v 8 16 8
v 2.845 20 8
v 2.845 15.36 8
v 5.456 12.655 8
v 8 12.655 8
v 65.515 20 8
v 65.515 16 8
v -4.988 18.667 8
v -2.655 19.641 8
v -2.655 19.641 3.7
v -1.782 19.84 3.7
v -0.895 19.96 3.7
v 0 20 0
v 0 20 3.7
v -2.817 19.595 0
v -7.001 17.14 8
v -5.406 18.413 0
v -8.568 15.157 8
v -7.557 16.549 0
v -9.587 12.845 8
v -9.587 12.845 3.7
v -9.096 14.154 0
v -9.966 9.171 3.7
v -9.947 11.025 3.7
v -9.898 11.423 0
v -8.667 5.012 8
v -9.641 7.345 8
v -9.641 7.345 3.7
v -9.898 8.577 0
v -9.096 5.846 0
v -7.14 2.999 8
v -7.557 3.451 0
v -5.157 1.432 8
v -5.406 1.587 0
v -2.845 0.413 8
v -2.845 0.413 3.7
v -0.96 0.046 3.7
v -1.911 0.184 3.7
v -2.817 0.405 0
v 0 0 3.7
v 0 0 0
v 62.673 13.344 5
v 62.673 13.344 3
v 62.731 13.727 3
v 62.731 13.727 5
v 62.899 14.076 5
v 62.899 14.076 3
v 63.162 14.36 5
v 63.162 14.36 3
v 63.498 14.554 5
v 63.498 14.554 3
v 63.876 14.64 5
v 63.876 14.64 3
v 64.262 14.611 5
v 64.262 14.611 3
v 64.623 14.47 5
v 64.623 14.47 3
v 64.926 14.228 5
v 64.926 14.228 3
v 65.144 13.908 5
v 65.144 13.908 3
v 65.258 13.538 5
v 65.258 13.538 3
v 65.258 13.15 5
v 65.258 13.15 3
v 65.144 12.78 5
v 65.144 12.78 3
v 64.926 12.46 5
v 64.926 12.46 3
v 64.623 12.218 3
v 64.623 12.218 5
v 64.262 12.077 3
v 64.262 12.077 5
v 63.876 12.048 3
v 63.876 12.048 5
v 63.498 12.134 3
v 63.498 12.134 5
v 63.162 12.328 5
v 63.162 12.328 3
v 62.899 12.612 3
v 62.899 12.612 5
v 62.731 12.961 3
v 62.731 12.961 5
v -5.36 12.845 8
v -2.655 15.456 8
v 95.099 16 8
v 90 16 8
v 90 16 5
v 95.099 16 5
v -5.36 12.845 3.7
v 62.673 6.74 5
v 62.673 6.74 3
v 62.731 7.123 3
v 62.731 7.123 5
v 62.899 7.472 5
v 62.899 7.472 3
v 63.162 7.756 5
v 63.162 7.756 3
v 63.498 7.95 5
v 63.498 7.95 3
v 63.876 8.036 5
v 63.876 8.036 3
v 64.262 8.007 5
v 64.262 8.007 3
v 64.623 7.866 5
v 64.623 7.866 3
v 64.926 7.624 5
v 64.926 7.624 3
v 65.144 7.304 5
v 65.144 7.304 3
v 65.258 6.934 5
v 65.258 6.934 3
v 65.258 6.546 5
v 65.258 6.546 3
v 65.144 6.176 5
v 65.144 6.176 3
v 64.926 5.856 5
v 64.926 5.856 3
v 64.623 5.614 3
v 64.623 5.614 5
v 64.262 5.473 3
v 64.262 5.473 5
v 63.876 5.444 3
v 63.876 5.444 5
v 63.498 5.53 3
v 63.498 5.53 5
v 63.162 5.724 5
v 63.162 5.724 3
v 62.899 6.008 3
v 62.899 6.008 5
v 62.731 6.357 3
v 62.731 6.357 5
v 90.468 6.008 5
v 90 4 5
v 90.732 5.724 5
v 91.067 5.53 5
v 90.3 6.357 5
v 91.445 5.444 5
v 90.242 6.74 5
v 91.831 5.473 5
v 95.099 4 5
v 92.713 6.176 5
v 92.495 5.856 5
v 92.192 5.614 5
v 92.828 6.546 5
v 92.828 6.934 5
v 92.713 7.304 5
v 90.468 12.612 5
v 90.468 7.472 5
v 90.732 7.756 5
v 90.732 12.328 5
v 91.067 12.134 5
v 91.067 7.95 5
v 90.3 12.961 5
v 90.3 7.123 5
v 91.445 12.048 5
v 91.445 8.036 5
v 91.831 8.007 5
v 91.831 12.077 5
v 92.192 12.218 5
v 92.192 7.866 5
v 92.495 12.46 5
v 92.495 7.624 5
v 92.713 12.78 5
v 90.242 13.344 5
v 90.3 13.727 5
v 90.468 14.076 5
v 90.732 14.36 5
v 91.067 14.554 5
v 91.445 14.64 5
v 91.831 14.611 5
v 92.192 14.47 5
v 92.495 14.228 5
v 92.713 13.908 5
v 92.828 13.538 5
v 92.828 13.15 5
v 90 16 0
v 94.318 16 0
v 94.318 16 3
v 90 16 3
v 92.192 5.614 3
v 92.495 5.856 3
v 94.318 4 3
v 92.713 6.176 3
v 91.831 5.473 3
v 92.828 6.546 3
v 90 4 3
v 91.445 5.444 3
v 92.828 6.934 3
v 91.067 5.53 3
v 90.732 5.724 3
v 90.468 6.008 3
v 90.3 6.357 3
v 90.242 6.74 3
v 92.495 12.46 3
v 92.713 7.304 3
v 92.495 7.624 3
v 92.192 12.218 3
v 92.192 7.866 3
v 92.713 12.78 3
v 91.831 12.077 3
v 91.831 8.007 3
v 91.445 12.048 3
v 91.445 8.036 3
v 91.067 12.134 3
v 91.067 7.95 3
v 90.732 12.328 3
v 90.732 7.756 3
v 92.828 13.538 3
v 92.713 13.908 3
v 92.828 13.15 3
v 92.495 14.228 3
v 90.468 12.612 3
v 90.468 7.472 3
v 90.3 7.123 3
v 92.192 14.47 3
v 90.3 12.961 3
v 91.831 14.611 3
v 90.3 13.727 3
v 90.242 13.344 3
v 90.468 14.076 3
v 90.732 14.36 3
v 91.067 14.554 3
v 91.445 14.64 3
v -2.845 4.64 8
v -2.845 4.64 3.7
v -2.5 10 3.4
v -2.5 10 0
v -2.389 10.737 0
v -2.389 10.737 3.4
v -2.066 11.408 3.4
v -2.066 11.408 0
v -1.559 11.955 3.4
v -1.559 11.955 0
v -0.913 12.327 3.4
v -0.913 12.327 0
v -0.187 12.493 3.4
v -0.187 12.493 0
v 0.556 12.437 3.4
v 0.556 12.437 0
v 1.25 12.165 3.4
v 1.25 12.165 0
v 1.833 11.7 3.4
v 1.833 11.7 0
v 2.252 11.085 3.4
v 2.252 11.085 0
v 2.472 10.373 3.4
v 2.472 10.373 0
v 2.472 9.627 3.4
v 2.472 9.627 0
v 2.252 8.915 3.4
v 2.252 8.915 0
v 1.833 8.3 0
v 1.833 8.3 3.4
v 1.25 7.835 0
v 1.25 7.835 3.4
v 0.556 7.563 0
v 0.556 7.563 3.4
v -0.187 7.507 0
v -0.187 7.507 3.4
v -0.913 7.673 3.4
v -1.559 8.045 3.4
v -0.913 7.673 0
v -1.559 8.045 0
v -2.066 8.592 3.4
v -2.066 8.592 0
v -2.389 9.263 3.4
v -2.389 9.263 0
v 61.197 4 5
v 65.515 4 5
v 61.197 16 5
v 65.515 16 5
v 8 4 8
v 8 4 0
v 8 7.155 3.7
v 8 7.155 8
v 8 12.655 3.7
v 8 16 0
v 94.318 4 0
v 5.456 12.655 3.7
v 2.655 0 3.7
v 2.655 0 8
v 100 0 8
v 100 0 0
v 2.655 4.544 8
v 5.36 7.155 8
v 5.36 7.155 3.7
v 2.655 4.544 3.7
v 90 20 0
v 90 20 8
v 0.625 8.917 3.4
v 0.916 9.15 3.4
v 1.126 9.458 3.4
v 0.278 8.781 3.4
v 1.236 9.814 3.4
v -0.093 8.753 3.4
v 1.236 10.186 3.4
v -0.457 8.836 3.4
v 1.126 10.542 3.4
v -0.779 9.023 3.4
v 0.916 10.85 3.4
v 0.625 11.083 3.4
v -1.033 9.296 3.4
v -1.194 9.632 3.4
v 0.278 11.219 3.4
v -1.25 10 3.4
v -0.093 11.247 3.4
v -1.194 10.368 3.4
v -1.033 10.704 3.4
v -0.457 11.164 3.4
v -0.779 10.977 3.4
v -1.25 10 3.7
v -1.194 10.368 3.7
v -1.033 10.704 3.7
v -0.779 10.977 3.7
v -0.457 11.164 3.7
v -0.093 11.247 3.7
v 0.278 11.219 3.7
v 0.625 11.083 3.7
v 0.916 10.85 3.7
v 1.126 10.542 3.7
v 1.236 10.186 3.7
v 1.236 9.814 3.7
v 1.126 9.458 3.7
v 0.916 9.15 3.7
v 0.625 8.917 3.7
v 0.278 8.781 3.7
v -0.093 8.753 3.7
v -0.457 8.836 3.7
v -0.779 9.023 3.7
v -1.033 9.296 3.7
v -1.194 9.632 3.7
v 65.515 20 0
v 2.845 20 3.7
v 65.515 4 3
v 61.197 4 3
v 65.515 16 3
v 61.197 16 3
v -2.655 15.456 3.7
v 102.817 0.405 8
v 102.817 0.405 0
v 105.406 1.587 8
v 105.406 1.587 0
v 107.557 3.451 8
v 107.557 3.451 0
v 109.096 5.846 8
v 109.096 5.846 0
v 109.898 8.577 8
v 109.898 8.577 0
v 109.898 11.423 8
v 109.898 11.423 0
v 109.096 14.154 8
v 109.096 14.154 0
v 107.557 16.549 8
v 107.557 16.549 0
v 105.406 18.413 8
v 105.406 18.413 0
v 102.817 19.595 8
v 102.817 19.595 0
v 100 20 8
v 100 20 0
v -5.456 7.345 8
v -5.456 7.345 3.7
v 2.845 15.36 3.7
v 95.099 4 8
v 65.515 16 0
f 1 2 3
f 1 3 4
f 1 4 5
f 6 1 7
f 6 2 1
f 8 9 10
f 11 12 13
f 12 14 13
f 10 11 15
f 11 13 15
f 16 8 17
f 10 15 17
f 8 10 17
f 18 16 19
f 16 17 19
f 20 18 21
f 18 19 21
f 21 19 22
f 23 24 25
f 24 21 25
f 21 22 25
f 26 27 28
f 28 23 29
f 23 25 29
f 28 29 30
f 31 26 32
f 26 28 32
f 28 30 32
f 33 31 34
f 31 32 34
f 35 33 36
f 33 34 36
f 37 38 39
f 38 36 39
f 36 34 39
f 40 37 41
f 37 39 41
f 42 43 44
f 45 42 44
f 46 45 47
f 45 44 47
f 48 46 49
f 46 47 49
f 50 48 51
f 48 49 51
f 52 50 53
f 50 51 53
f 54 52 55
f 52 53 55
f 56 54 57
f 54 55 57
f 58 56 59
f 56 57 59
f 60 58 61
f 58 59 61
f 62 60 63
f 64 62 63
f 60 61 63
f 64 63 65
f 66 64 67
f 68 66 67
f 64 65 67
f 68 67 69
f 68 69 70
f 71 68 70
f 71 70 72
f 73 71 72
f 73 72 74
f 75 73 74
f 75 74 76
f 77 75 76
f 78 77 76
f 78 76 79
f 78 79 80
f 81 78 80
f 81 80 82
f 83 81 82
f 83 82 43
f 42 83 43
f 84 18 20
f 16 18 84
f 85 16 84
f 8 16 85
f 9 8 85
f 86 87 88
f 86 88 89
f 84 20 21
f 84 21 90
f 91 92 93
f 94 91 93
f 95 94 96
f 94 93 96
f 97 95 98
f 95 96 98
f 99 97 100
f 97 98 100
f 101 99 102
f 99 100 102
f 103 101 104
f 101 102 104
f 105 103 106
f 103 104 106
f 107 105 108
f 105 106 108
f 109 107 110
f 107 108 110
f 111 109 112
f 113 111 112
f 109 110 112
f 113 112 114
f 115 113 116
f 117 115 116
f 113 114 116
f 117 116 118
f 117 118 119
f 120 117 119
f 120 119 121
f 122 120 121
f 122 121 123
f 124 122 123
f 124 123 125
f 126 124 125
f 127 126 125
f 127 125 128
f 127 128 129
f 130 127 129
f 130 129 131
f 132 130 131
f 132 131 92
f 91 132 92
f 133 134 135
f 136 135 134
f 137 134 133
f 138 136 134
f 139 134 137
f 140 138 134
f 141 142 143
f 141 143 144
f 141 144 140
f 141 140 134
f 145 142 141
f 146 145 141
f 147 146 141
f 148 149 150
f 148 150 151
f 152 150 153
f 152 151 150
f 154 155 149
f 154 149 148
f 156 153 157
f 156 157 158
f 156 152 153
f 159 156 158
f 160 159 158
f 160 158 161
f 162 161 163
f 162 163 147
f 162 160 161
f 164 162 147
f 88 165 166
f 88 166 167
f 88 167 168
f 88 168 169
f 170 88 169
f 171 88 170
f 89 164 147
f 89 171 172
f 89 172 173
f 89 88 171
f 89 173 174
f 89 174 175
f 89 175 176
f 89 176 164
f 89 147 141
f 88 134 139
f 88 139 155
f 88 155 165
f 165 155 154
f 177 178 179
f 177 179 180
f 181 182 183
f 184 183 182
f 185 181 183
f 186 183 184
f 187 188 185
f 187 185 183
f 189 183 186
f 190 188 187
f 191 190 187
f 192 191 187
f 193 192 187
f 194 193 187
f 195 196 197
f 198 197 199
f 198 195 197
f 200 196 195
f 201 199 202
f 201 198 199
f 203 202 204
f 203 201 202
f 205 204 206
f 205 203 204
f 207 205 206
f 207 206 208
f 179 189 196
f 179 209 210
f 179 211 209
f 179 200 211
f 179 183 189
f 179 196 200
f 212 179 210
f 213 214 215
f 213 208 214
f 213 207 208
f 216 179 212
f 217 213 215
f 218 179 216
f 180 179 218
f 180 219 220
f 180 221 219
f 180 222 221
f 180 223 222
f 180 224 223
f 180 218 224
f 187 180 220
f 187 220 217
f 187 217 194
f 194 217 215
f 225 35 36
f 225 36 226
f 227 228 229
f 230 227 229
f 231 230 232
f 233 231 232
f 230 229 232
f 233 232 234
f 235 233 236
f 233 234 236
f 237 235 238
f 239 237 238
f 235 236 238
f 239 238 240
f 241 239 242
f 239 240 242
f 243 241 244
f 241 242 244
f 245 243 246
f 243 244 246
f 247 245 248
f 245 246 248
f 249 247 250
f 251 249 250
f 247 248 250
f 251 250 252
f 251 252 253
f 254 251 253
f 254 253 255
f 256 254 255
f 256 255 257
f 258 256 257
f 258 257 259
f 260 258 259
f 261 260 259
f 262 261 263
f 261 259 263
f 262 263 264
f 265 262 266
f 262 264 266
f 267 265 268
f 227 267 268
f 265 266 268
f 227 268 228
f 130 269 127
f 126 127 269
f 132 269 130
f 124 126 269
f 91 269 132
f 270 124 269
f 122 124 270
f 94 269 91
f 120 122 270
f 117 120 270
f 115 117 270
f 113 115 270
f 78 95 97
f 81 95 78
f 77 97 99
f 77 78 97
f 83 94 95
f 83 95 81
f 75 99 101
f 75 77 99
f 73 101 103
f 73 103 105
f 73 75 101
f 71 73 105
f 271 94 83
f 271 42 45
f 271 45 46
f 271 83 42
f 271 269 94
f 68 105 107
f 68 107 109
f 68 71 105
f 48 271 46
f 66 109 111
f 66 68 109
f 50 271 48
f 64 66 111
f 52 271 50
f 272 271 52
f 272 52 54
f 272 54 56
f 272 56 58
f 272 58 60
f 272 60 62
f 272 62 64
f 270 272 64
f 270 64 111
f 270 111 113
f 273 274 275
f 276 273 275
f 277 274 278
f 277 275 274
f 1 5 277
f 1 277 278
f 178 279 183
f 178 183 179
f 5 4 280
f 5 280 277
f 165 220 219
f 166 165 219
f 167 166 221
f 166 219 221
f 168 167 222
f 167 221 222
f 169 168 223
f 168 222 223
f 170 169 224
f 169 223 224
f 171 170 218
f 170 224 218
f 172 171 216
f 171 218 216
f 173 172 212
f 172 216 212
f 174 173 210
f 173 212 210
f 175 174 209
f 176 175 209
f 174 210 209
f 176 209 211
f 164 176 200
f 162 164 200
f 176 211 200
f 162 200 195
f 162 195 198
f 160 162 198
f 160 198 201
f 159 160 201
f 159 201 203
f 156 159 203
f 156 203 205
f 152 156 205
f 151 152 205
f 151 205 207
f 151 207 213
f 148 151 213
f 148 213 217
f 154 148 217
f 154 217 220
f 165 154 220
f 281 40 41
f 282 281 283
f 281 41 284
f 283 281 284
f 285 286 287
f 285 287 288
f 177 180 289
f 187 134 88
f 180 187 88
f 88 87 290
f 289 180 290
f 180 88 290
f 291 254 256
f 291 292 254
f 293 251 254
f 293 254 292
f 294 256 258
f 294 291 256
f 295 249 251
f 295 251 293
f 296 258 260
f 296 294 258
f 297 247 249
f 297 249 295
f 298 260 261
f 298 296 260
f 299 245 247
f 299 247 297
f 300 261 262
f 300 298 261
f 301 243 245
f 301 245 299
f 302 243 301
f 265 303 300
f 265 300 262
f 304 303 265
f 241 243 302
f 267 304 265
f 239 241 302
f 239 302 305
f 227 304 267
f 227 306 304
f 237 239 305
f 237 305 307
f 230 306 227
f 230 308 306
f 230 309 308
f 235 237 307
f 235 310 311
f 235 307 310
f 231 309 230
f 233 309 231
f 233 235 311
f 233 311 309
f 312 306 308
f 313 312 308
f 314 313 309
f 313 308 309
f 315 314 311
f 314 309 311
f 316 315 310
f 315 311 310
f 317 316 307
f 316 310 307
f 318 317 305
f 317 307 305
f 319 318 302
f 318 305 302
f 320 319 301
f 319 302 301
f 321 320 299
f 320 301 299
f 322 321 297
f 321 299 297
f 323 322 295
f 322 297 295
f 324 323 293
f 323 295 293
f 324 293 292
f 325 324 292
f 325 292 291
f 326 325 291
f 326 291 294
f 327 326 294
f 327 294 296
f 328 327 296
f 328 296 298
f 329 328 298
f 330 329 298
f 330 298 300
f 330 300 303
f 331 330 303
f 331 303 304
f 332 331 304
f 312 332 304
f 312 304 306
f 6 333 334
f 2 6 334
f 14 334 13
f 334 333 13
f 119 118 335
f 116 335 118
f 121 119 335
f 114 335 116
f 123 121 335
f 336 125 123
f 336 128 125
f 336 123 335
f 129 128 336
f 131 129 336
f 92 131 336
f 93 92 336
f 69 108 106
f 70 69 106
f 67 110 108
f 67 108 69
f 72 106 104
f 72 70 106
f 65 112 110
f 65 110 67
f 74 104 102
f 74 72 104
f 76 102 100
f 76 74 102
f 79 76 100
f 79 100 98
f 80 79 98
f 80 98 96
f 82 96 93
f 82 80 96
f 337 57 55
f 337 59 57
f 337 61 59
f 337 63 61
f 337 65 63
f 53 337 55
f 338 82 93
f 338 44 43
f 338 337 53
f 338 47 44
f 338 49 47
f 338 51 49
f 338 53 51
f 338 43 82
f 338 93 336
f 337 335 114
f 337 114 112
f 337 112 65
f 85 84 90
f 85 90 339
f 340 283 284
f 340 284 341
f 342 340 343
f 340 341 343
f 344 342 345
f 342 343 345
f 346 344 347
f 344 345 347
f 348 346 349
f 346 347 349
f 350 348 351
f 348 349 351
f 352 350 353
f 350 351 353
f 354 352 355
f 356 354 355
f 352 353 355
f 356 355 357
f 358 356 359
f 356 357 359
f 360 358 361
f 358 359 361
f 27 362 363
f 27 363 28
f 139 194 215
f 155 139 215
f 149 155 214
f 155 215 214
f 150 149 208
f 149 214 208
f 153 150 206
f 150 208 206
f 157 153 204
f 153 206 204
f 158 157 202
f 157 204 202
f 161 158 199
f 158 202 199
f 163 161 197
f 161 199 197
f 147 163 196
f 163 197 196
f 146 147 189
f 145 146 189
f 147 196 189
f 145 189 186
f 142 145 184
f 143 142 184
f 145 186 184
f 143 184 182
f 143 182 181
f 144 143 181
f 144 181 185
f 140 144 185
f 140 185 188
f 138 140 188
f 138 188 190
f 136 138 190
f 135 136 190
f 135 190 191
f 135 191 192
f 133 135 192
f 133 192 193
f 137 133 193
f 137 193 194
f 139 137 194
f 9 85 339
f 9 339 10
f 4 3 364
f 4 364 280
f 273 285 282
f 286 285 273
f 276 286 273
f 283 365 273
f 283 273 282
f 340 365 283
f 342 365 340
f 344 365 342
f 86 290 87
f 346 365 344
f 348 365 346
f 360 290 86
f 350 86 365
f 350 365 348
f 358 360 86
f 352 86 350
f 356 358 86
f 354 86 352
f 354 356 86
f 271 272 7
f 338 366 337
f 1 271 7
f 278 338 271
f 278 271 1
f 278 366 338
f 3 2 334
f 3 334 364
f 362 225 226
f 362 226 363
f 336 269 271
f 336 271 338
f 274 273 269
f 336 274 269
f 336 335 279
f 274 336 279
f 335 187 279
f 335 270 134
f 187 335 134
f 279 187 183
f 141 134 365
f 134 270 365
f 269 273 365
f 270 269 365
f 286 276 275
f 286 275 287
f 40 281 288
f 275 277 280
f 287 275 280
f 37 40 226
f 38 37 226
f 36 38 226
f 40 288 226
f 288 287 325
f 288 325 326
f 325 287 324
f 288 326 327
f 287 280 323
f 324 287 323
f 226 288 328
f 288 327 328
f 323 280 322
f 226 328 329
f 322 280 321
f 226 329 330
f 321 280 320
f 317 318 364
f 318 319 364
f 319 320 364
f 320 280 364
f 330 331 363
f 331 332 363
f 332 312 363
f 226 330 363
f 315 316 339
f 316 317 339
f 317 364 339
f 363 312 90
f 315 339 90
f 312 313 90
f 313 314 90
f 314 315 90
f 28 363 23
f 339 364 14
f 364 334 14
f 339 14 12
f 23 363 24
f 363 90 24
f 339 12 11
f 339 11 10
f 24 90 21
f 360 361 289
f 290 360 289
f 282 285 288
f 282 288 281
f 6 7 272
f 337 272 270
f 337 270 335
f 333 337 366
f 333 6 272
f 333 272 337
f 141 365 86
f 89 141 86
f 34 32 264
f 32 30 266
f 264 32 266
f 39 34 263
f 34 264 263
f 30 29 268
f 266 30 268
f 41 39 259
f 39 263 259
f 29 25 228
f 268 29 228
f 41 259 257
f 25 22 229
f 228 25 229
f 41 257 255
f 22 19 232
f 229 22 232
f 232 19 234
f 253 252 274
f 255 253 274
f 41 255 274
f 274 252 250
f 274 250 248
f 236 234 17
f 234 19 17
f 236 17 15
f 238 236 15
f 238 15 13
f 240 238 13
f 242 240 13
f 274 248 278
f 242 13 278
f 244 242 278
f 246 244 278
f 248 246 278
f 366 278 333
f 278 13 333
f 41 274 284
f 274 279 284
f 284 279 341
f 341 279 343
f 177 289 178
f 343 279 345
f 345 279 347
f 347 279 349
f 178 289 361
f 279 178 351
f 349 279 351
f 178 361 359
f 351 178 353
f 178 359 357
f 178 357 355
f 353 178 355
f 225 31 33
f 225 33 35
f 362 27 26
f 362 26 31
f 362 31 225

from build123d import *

# Parameters (mm, degrees)
BOSS_EXTRU_1_DEPTH       = 8
ESQUISSE4_W              = 82
ESQUISSE4_H              = 12
ENL_V_MAT_EXTRU_3_DEPTH  = 9
BOSS_EXTRU_2_REACH       = 18
ESQUISSE6_W              = 4.318
ESQUISSE6_H              = 8
ESQUISSE7_R              = 1.3
ENL_V_MAT_EXTRU_5_DEPTH  = 10
ESQUISSE8_W              = 5.09860661
ESQUISSE8_H              = 12
ESQUISSE8_W_2            = 4.318
ENL_V_MAT_EXTRU_6_DEPTH  = 3
ESQUISSE13_R             = 4
ENL_V_MAT_EXTRU_9_DEPTH  = 4.3
ENL_V_MAT_EXTRU_10_DEPTH = 4.3
ESQUISSE15_R             = 2.5
ENL_V_MAT_EXTRU_11_DEPTH = 3.4
ENL_V_MAT_EXTRU_12_REACH = 6.6
ESQUISSE16_R             = 1.25
ESQUISSE17_W             = 24.484825334
ESQUISSE17_H             = 8
ENL_V_MAT_EXTRU_13_DEPTH = 4.3
ESQUISSE18_W             = 4.318
ESQUISSE18_H             = 12
ENL_V_MAT_EXTRU_14_DEPTH = 3


with BuildPart() as part:
    # Esquisse1 → Boss.-Extru.1 (new body)
    with BuildSketch(Plane.XY):
        with BuildLine():
            Line((0, 0), (100, 0))
            ThreePointArc((100, 0), (110, 10), (100, 20))
            Line((100, 20), (0, 20))
            ThreePointArc((0, 20), (-10, 10), (0, 0))
        make_face()
    extrude(amount=BOSS_EXTRU_1_DEPTH)

    # Esquisse4 → Enlèv. mat.-Extru.3 (cut, through all)
    with BuildSketch(Plane.XY.offset(8)):
        with Locations((49, 10)):
            Rectangle(ESQUISSE4_W, ESQUISSE4_H)
    extrude(amount=-ENL_V_MAT_EXTRU_3_DEPTH, mode=Mode.SUBTRACT)

    # Esquisse6 → Boss.-Extru.2 (add, up to next)
    with BuildSketch(Plane(origin=(0, 4, 0), x_dir=(1, 0, 0), z_dir=(0, 1, 0)), mode=Mode.PRIVATE) as boss_extru_2_sk1:
        with Locations((63.356174666, -4)):
            Rectangle(ESQUISSE6_W, ESQUISSE6_H)
    boss_extru_2_tool1 = extrude(boss_extru_2_sk1.sketch, amount=BOSS_EXTRU_2_REACH, mode=Mode.PRIVATE) - part.part
    add(boss_extru_2_tool1.solids().sort_by_distance((63.356175, 4, 4))[0])

    # Esquisse7 → Enlèv. mat.-Extru.5 (cut)
    with BuildSketch(Plane(origin=(0, 0, 0), x_dir=(-1, 0, 0), z_dir=(0, 0, -1))):
        with Locations((-91.542174666, 13.344)):
            Circle(ESQUISSE7_R)
        with Locations((-91.542174666, 6.74)):
            Circle(ESQUISSE7_R)
        with Locations((-63.973, 6.74)):
            Circle(ESQUISSE7_R)
        with Locations((-63.973, 13.344)):
            Circle(ESQUISSE7_R)
    extrude(amount=-ENL_V_MAT_EXTRU_5_DEPTH, mode=Mode.SUBTRACT)

    # Esquisse8 → Enlèv. mat.-Extru.6 (cut)
    with BuildSketch(Plane.XY.offset(8)):
        with Locations((92.549303305, 10)):
            Rectangle(ESQUISSE8_W, ESQUISSE8_H)
        with Locations((63.356174666, 10)):
            Rectangle(ESQUISSE8_W_2, ESQUISSE8_H)
    extrude(amount=-ENL_V_MAT_EXTRU_6_DEPTH, mode=Mode.SUBTRACT)

    # Esquisse13 → Enlèv. mat.-Extru.9 (cut)
    with BuildSketch(Plane.XY.offset(8)):
        with Locations((0, 10)):
            Circle(ESQUISSE13_R)
    extrude(amount=-ENL_V_MAT_EXTRU_9_DEPTH, mode=Mode.SUBTRACT)

    # Esquisse14 → Enlèv. mat.-Extru.10 (cut)
    with BuildSketch(Plane.XY.offset(8)):
        Polygon((2.655377087, 4.544050257), (2.655377087, -2.008601379), (-2.844622913, -1.912365766), (-2.844622913, 4.640285869), (-5.455949743, 7.344622913), (-12.008601379, 7.344622913), (-11.912365766, 12.844622913), (-5.359714131, 12.844622913), (-2.655377087, 15.455949743), (-2.655377087, 22.008601379), (2.844622913, 21.912365766), (2.844622913, 15.359714131), (5.455949743, 12.655377087), (12.008601379, 12.655377087), (11.912365766, 7.155377087), (5.359714131, 7.155377087), align=None)
    extrude(amount=-ENL_V_MAT_EXTRU_10_DEPTH, mode=Mode.SUBTRACT)

    # Esquisse15 → Enlèv. mat.-Extru.11 (cut)
    with BuildSketch(Plane(origin=(0, 0, 0), x_dir=(-1, 0, 0), z_dir=(0, 0, -1))):
        with Locations((0, 10)):
            Circle(ESQUISSE15_R)
    extrude(amount=-ENL_V_MAT_EXTRU_11_DEPTH, mode=Mode.SUBTRACT)

    # Esquisse16 → Enlèv. mat.-Extru.12 (cut, up to next)
    with BuildSketch(Plane(origin=(0, 0, 3.4), x_dir=(-1, 0, 0), z_dir=(0, 0, -1)), mode=Mode.PRIVATE) as enl_v_mat_extru_12_sk1:
        with Locations((0, 10)):
            Circle(ESQUISSE16_R)
    enl_v_mat_extru_12_tool1 = extrude(enl_v_mat_extru_12_sk1.sketch, amount=-ENL_V_MAT_EXTRU_12_REACH, mode=Mode.PRIVATE) & part.part
    add(enl_v_mat_extru_12_tool1.solids().sort_by_distance((0, 10, 3.4))[0], mode=Mode.SUBTRACT)

    # Esquisse17 → Enlèv. mat.-Extru.13 (cut)
    with BuildSketch(Plane(origin=(0, 20, 0), x_dir=(1, 0, 0), z_dir=(0, 1, 0))):
        with Locations((77.757587333, -4)):
            Rectangle(ESQUISSE17_W, ESQUISSE17_H)
    extrude(amount=-ENL_V_MAT_EXTRU_13_DEPTH, mode=Mode.SUBTRACT)

    # Esquisse18 → Enlèv. mat.-Extru.14 (cut)
    with BuildSketch(Plane(origin=(0, 0, 0), x_dir=(-1, 0, 0), z_dir=(0, 0, -1))):
        with Locations((-63.356174666, 10)):
            Rectangle(ESQUISSE18_W, ESQUISSE18_H)
        with Locations((-92.159, 10)):
            Rectangle(ESQUISSE18_W, ESQUISSE18_H)
    extrude(amount=-ENL_V_MAT_EXTRU_14_DEPTH, mode=Mode.SUBTRACT)


solid = part.part
